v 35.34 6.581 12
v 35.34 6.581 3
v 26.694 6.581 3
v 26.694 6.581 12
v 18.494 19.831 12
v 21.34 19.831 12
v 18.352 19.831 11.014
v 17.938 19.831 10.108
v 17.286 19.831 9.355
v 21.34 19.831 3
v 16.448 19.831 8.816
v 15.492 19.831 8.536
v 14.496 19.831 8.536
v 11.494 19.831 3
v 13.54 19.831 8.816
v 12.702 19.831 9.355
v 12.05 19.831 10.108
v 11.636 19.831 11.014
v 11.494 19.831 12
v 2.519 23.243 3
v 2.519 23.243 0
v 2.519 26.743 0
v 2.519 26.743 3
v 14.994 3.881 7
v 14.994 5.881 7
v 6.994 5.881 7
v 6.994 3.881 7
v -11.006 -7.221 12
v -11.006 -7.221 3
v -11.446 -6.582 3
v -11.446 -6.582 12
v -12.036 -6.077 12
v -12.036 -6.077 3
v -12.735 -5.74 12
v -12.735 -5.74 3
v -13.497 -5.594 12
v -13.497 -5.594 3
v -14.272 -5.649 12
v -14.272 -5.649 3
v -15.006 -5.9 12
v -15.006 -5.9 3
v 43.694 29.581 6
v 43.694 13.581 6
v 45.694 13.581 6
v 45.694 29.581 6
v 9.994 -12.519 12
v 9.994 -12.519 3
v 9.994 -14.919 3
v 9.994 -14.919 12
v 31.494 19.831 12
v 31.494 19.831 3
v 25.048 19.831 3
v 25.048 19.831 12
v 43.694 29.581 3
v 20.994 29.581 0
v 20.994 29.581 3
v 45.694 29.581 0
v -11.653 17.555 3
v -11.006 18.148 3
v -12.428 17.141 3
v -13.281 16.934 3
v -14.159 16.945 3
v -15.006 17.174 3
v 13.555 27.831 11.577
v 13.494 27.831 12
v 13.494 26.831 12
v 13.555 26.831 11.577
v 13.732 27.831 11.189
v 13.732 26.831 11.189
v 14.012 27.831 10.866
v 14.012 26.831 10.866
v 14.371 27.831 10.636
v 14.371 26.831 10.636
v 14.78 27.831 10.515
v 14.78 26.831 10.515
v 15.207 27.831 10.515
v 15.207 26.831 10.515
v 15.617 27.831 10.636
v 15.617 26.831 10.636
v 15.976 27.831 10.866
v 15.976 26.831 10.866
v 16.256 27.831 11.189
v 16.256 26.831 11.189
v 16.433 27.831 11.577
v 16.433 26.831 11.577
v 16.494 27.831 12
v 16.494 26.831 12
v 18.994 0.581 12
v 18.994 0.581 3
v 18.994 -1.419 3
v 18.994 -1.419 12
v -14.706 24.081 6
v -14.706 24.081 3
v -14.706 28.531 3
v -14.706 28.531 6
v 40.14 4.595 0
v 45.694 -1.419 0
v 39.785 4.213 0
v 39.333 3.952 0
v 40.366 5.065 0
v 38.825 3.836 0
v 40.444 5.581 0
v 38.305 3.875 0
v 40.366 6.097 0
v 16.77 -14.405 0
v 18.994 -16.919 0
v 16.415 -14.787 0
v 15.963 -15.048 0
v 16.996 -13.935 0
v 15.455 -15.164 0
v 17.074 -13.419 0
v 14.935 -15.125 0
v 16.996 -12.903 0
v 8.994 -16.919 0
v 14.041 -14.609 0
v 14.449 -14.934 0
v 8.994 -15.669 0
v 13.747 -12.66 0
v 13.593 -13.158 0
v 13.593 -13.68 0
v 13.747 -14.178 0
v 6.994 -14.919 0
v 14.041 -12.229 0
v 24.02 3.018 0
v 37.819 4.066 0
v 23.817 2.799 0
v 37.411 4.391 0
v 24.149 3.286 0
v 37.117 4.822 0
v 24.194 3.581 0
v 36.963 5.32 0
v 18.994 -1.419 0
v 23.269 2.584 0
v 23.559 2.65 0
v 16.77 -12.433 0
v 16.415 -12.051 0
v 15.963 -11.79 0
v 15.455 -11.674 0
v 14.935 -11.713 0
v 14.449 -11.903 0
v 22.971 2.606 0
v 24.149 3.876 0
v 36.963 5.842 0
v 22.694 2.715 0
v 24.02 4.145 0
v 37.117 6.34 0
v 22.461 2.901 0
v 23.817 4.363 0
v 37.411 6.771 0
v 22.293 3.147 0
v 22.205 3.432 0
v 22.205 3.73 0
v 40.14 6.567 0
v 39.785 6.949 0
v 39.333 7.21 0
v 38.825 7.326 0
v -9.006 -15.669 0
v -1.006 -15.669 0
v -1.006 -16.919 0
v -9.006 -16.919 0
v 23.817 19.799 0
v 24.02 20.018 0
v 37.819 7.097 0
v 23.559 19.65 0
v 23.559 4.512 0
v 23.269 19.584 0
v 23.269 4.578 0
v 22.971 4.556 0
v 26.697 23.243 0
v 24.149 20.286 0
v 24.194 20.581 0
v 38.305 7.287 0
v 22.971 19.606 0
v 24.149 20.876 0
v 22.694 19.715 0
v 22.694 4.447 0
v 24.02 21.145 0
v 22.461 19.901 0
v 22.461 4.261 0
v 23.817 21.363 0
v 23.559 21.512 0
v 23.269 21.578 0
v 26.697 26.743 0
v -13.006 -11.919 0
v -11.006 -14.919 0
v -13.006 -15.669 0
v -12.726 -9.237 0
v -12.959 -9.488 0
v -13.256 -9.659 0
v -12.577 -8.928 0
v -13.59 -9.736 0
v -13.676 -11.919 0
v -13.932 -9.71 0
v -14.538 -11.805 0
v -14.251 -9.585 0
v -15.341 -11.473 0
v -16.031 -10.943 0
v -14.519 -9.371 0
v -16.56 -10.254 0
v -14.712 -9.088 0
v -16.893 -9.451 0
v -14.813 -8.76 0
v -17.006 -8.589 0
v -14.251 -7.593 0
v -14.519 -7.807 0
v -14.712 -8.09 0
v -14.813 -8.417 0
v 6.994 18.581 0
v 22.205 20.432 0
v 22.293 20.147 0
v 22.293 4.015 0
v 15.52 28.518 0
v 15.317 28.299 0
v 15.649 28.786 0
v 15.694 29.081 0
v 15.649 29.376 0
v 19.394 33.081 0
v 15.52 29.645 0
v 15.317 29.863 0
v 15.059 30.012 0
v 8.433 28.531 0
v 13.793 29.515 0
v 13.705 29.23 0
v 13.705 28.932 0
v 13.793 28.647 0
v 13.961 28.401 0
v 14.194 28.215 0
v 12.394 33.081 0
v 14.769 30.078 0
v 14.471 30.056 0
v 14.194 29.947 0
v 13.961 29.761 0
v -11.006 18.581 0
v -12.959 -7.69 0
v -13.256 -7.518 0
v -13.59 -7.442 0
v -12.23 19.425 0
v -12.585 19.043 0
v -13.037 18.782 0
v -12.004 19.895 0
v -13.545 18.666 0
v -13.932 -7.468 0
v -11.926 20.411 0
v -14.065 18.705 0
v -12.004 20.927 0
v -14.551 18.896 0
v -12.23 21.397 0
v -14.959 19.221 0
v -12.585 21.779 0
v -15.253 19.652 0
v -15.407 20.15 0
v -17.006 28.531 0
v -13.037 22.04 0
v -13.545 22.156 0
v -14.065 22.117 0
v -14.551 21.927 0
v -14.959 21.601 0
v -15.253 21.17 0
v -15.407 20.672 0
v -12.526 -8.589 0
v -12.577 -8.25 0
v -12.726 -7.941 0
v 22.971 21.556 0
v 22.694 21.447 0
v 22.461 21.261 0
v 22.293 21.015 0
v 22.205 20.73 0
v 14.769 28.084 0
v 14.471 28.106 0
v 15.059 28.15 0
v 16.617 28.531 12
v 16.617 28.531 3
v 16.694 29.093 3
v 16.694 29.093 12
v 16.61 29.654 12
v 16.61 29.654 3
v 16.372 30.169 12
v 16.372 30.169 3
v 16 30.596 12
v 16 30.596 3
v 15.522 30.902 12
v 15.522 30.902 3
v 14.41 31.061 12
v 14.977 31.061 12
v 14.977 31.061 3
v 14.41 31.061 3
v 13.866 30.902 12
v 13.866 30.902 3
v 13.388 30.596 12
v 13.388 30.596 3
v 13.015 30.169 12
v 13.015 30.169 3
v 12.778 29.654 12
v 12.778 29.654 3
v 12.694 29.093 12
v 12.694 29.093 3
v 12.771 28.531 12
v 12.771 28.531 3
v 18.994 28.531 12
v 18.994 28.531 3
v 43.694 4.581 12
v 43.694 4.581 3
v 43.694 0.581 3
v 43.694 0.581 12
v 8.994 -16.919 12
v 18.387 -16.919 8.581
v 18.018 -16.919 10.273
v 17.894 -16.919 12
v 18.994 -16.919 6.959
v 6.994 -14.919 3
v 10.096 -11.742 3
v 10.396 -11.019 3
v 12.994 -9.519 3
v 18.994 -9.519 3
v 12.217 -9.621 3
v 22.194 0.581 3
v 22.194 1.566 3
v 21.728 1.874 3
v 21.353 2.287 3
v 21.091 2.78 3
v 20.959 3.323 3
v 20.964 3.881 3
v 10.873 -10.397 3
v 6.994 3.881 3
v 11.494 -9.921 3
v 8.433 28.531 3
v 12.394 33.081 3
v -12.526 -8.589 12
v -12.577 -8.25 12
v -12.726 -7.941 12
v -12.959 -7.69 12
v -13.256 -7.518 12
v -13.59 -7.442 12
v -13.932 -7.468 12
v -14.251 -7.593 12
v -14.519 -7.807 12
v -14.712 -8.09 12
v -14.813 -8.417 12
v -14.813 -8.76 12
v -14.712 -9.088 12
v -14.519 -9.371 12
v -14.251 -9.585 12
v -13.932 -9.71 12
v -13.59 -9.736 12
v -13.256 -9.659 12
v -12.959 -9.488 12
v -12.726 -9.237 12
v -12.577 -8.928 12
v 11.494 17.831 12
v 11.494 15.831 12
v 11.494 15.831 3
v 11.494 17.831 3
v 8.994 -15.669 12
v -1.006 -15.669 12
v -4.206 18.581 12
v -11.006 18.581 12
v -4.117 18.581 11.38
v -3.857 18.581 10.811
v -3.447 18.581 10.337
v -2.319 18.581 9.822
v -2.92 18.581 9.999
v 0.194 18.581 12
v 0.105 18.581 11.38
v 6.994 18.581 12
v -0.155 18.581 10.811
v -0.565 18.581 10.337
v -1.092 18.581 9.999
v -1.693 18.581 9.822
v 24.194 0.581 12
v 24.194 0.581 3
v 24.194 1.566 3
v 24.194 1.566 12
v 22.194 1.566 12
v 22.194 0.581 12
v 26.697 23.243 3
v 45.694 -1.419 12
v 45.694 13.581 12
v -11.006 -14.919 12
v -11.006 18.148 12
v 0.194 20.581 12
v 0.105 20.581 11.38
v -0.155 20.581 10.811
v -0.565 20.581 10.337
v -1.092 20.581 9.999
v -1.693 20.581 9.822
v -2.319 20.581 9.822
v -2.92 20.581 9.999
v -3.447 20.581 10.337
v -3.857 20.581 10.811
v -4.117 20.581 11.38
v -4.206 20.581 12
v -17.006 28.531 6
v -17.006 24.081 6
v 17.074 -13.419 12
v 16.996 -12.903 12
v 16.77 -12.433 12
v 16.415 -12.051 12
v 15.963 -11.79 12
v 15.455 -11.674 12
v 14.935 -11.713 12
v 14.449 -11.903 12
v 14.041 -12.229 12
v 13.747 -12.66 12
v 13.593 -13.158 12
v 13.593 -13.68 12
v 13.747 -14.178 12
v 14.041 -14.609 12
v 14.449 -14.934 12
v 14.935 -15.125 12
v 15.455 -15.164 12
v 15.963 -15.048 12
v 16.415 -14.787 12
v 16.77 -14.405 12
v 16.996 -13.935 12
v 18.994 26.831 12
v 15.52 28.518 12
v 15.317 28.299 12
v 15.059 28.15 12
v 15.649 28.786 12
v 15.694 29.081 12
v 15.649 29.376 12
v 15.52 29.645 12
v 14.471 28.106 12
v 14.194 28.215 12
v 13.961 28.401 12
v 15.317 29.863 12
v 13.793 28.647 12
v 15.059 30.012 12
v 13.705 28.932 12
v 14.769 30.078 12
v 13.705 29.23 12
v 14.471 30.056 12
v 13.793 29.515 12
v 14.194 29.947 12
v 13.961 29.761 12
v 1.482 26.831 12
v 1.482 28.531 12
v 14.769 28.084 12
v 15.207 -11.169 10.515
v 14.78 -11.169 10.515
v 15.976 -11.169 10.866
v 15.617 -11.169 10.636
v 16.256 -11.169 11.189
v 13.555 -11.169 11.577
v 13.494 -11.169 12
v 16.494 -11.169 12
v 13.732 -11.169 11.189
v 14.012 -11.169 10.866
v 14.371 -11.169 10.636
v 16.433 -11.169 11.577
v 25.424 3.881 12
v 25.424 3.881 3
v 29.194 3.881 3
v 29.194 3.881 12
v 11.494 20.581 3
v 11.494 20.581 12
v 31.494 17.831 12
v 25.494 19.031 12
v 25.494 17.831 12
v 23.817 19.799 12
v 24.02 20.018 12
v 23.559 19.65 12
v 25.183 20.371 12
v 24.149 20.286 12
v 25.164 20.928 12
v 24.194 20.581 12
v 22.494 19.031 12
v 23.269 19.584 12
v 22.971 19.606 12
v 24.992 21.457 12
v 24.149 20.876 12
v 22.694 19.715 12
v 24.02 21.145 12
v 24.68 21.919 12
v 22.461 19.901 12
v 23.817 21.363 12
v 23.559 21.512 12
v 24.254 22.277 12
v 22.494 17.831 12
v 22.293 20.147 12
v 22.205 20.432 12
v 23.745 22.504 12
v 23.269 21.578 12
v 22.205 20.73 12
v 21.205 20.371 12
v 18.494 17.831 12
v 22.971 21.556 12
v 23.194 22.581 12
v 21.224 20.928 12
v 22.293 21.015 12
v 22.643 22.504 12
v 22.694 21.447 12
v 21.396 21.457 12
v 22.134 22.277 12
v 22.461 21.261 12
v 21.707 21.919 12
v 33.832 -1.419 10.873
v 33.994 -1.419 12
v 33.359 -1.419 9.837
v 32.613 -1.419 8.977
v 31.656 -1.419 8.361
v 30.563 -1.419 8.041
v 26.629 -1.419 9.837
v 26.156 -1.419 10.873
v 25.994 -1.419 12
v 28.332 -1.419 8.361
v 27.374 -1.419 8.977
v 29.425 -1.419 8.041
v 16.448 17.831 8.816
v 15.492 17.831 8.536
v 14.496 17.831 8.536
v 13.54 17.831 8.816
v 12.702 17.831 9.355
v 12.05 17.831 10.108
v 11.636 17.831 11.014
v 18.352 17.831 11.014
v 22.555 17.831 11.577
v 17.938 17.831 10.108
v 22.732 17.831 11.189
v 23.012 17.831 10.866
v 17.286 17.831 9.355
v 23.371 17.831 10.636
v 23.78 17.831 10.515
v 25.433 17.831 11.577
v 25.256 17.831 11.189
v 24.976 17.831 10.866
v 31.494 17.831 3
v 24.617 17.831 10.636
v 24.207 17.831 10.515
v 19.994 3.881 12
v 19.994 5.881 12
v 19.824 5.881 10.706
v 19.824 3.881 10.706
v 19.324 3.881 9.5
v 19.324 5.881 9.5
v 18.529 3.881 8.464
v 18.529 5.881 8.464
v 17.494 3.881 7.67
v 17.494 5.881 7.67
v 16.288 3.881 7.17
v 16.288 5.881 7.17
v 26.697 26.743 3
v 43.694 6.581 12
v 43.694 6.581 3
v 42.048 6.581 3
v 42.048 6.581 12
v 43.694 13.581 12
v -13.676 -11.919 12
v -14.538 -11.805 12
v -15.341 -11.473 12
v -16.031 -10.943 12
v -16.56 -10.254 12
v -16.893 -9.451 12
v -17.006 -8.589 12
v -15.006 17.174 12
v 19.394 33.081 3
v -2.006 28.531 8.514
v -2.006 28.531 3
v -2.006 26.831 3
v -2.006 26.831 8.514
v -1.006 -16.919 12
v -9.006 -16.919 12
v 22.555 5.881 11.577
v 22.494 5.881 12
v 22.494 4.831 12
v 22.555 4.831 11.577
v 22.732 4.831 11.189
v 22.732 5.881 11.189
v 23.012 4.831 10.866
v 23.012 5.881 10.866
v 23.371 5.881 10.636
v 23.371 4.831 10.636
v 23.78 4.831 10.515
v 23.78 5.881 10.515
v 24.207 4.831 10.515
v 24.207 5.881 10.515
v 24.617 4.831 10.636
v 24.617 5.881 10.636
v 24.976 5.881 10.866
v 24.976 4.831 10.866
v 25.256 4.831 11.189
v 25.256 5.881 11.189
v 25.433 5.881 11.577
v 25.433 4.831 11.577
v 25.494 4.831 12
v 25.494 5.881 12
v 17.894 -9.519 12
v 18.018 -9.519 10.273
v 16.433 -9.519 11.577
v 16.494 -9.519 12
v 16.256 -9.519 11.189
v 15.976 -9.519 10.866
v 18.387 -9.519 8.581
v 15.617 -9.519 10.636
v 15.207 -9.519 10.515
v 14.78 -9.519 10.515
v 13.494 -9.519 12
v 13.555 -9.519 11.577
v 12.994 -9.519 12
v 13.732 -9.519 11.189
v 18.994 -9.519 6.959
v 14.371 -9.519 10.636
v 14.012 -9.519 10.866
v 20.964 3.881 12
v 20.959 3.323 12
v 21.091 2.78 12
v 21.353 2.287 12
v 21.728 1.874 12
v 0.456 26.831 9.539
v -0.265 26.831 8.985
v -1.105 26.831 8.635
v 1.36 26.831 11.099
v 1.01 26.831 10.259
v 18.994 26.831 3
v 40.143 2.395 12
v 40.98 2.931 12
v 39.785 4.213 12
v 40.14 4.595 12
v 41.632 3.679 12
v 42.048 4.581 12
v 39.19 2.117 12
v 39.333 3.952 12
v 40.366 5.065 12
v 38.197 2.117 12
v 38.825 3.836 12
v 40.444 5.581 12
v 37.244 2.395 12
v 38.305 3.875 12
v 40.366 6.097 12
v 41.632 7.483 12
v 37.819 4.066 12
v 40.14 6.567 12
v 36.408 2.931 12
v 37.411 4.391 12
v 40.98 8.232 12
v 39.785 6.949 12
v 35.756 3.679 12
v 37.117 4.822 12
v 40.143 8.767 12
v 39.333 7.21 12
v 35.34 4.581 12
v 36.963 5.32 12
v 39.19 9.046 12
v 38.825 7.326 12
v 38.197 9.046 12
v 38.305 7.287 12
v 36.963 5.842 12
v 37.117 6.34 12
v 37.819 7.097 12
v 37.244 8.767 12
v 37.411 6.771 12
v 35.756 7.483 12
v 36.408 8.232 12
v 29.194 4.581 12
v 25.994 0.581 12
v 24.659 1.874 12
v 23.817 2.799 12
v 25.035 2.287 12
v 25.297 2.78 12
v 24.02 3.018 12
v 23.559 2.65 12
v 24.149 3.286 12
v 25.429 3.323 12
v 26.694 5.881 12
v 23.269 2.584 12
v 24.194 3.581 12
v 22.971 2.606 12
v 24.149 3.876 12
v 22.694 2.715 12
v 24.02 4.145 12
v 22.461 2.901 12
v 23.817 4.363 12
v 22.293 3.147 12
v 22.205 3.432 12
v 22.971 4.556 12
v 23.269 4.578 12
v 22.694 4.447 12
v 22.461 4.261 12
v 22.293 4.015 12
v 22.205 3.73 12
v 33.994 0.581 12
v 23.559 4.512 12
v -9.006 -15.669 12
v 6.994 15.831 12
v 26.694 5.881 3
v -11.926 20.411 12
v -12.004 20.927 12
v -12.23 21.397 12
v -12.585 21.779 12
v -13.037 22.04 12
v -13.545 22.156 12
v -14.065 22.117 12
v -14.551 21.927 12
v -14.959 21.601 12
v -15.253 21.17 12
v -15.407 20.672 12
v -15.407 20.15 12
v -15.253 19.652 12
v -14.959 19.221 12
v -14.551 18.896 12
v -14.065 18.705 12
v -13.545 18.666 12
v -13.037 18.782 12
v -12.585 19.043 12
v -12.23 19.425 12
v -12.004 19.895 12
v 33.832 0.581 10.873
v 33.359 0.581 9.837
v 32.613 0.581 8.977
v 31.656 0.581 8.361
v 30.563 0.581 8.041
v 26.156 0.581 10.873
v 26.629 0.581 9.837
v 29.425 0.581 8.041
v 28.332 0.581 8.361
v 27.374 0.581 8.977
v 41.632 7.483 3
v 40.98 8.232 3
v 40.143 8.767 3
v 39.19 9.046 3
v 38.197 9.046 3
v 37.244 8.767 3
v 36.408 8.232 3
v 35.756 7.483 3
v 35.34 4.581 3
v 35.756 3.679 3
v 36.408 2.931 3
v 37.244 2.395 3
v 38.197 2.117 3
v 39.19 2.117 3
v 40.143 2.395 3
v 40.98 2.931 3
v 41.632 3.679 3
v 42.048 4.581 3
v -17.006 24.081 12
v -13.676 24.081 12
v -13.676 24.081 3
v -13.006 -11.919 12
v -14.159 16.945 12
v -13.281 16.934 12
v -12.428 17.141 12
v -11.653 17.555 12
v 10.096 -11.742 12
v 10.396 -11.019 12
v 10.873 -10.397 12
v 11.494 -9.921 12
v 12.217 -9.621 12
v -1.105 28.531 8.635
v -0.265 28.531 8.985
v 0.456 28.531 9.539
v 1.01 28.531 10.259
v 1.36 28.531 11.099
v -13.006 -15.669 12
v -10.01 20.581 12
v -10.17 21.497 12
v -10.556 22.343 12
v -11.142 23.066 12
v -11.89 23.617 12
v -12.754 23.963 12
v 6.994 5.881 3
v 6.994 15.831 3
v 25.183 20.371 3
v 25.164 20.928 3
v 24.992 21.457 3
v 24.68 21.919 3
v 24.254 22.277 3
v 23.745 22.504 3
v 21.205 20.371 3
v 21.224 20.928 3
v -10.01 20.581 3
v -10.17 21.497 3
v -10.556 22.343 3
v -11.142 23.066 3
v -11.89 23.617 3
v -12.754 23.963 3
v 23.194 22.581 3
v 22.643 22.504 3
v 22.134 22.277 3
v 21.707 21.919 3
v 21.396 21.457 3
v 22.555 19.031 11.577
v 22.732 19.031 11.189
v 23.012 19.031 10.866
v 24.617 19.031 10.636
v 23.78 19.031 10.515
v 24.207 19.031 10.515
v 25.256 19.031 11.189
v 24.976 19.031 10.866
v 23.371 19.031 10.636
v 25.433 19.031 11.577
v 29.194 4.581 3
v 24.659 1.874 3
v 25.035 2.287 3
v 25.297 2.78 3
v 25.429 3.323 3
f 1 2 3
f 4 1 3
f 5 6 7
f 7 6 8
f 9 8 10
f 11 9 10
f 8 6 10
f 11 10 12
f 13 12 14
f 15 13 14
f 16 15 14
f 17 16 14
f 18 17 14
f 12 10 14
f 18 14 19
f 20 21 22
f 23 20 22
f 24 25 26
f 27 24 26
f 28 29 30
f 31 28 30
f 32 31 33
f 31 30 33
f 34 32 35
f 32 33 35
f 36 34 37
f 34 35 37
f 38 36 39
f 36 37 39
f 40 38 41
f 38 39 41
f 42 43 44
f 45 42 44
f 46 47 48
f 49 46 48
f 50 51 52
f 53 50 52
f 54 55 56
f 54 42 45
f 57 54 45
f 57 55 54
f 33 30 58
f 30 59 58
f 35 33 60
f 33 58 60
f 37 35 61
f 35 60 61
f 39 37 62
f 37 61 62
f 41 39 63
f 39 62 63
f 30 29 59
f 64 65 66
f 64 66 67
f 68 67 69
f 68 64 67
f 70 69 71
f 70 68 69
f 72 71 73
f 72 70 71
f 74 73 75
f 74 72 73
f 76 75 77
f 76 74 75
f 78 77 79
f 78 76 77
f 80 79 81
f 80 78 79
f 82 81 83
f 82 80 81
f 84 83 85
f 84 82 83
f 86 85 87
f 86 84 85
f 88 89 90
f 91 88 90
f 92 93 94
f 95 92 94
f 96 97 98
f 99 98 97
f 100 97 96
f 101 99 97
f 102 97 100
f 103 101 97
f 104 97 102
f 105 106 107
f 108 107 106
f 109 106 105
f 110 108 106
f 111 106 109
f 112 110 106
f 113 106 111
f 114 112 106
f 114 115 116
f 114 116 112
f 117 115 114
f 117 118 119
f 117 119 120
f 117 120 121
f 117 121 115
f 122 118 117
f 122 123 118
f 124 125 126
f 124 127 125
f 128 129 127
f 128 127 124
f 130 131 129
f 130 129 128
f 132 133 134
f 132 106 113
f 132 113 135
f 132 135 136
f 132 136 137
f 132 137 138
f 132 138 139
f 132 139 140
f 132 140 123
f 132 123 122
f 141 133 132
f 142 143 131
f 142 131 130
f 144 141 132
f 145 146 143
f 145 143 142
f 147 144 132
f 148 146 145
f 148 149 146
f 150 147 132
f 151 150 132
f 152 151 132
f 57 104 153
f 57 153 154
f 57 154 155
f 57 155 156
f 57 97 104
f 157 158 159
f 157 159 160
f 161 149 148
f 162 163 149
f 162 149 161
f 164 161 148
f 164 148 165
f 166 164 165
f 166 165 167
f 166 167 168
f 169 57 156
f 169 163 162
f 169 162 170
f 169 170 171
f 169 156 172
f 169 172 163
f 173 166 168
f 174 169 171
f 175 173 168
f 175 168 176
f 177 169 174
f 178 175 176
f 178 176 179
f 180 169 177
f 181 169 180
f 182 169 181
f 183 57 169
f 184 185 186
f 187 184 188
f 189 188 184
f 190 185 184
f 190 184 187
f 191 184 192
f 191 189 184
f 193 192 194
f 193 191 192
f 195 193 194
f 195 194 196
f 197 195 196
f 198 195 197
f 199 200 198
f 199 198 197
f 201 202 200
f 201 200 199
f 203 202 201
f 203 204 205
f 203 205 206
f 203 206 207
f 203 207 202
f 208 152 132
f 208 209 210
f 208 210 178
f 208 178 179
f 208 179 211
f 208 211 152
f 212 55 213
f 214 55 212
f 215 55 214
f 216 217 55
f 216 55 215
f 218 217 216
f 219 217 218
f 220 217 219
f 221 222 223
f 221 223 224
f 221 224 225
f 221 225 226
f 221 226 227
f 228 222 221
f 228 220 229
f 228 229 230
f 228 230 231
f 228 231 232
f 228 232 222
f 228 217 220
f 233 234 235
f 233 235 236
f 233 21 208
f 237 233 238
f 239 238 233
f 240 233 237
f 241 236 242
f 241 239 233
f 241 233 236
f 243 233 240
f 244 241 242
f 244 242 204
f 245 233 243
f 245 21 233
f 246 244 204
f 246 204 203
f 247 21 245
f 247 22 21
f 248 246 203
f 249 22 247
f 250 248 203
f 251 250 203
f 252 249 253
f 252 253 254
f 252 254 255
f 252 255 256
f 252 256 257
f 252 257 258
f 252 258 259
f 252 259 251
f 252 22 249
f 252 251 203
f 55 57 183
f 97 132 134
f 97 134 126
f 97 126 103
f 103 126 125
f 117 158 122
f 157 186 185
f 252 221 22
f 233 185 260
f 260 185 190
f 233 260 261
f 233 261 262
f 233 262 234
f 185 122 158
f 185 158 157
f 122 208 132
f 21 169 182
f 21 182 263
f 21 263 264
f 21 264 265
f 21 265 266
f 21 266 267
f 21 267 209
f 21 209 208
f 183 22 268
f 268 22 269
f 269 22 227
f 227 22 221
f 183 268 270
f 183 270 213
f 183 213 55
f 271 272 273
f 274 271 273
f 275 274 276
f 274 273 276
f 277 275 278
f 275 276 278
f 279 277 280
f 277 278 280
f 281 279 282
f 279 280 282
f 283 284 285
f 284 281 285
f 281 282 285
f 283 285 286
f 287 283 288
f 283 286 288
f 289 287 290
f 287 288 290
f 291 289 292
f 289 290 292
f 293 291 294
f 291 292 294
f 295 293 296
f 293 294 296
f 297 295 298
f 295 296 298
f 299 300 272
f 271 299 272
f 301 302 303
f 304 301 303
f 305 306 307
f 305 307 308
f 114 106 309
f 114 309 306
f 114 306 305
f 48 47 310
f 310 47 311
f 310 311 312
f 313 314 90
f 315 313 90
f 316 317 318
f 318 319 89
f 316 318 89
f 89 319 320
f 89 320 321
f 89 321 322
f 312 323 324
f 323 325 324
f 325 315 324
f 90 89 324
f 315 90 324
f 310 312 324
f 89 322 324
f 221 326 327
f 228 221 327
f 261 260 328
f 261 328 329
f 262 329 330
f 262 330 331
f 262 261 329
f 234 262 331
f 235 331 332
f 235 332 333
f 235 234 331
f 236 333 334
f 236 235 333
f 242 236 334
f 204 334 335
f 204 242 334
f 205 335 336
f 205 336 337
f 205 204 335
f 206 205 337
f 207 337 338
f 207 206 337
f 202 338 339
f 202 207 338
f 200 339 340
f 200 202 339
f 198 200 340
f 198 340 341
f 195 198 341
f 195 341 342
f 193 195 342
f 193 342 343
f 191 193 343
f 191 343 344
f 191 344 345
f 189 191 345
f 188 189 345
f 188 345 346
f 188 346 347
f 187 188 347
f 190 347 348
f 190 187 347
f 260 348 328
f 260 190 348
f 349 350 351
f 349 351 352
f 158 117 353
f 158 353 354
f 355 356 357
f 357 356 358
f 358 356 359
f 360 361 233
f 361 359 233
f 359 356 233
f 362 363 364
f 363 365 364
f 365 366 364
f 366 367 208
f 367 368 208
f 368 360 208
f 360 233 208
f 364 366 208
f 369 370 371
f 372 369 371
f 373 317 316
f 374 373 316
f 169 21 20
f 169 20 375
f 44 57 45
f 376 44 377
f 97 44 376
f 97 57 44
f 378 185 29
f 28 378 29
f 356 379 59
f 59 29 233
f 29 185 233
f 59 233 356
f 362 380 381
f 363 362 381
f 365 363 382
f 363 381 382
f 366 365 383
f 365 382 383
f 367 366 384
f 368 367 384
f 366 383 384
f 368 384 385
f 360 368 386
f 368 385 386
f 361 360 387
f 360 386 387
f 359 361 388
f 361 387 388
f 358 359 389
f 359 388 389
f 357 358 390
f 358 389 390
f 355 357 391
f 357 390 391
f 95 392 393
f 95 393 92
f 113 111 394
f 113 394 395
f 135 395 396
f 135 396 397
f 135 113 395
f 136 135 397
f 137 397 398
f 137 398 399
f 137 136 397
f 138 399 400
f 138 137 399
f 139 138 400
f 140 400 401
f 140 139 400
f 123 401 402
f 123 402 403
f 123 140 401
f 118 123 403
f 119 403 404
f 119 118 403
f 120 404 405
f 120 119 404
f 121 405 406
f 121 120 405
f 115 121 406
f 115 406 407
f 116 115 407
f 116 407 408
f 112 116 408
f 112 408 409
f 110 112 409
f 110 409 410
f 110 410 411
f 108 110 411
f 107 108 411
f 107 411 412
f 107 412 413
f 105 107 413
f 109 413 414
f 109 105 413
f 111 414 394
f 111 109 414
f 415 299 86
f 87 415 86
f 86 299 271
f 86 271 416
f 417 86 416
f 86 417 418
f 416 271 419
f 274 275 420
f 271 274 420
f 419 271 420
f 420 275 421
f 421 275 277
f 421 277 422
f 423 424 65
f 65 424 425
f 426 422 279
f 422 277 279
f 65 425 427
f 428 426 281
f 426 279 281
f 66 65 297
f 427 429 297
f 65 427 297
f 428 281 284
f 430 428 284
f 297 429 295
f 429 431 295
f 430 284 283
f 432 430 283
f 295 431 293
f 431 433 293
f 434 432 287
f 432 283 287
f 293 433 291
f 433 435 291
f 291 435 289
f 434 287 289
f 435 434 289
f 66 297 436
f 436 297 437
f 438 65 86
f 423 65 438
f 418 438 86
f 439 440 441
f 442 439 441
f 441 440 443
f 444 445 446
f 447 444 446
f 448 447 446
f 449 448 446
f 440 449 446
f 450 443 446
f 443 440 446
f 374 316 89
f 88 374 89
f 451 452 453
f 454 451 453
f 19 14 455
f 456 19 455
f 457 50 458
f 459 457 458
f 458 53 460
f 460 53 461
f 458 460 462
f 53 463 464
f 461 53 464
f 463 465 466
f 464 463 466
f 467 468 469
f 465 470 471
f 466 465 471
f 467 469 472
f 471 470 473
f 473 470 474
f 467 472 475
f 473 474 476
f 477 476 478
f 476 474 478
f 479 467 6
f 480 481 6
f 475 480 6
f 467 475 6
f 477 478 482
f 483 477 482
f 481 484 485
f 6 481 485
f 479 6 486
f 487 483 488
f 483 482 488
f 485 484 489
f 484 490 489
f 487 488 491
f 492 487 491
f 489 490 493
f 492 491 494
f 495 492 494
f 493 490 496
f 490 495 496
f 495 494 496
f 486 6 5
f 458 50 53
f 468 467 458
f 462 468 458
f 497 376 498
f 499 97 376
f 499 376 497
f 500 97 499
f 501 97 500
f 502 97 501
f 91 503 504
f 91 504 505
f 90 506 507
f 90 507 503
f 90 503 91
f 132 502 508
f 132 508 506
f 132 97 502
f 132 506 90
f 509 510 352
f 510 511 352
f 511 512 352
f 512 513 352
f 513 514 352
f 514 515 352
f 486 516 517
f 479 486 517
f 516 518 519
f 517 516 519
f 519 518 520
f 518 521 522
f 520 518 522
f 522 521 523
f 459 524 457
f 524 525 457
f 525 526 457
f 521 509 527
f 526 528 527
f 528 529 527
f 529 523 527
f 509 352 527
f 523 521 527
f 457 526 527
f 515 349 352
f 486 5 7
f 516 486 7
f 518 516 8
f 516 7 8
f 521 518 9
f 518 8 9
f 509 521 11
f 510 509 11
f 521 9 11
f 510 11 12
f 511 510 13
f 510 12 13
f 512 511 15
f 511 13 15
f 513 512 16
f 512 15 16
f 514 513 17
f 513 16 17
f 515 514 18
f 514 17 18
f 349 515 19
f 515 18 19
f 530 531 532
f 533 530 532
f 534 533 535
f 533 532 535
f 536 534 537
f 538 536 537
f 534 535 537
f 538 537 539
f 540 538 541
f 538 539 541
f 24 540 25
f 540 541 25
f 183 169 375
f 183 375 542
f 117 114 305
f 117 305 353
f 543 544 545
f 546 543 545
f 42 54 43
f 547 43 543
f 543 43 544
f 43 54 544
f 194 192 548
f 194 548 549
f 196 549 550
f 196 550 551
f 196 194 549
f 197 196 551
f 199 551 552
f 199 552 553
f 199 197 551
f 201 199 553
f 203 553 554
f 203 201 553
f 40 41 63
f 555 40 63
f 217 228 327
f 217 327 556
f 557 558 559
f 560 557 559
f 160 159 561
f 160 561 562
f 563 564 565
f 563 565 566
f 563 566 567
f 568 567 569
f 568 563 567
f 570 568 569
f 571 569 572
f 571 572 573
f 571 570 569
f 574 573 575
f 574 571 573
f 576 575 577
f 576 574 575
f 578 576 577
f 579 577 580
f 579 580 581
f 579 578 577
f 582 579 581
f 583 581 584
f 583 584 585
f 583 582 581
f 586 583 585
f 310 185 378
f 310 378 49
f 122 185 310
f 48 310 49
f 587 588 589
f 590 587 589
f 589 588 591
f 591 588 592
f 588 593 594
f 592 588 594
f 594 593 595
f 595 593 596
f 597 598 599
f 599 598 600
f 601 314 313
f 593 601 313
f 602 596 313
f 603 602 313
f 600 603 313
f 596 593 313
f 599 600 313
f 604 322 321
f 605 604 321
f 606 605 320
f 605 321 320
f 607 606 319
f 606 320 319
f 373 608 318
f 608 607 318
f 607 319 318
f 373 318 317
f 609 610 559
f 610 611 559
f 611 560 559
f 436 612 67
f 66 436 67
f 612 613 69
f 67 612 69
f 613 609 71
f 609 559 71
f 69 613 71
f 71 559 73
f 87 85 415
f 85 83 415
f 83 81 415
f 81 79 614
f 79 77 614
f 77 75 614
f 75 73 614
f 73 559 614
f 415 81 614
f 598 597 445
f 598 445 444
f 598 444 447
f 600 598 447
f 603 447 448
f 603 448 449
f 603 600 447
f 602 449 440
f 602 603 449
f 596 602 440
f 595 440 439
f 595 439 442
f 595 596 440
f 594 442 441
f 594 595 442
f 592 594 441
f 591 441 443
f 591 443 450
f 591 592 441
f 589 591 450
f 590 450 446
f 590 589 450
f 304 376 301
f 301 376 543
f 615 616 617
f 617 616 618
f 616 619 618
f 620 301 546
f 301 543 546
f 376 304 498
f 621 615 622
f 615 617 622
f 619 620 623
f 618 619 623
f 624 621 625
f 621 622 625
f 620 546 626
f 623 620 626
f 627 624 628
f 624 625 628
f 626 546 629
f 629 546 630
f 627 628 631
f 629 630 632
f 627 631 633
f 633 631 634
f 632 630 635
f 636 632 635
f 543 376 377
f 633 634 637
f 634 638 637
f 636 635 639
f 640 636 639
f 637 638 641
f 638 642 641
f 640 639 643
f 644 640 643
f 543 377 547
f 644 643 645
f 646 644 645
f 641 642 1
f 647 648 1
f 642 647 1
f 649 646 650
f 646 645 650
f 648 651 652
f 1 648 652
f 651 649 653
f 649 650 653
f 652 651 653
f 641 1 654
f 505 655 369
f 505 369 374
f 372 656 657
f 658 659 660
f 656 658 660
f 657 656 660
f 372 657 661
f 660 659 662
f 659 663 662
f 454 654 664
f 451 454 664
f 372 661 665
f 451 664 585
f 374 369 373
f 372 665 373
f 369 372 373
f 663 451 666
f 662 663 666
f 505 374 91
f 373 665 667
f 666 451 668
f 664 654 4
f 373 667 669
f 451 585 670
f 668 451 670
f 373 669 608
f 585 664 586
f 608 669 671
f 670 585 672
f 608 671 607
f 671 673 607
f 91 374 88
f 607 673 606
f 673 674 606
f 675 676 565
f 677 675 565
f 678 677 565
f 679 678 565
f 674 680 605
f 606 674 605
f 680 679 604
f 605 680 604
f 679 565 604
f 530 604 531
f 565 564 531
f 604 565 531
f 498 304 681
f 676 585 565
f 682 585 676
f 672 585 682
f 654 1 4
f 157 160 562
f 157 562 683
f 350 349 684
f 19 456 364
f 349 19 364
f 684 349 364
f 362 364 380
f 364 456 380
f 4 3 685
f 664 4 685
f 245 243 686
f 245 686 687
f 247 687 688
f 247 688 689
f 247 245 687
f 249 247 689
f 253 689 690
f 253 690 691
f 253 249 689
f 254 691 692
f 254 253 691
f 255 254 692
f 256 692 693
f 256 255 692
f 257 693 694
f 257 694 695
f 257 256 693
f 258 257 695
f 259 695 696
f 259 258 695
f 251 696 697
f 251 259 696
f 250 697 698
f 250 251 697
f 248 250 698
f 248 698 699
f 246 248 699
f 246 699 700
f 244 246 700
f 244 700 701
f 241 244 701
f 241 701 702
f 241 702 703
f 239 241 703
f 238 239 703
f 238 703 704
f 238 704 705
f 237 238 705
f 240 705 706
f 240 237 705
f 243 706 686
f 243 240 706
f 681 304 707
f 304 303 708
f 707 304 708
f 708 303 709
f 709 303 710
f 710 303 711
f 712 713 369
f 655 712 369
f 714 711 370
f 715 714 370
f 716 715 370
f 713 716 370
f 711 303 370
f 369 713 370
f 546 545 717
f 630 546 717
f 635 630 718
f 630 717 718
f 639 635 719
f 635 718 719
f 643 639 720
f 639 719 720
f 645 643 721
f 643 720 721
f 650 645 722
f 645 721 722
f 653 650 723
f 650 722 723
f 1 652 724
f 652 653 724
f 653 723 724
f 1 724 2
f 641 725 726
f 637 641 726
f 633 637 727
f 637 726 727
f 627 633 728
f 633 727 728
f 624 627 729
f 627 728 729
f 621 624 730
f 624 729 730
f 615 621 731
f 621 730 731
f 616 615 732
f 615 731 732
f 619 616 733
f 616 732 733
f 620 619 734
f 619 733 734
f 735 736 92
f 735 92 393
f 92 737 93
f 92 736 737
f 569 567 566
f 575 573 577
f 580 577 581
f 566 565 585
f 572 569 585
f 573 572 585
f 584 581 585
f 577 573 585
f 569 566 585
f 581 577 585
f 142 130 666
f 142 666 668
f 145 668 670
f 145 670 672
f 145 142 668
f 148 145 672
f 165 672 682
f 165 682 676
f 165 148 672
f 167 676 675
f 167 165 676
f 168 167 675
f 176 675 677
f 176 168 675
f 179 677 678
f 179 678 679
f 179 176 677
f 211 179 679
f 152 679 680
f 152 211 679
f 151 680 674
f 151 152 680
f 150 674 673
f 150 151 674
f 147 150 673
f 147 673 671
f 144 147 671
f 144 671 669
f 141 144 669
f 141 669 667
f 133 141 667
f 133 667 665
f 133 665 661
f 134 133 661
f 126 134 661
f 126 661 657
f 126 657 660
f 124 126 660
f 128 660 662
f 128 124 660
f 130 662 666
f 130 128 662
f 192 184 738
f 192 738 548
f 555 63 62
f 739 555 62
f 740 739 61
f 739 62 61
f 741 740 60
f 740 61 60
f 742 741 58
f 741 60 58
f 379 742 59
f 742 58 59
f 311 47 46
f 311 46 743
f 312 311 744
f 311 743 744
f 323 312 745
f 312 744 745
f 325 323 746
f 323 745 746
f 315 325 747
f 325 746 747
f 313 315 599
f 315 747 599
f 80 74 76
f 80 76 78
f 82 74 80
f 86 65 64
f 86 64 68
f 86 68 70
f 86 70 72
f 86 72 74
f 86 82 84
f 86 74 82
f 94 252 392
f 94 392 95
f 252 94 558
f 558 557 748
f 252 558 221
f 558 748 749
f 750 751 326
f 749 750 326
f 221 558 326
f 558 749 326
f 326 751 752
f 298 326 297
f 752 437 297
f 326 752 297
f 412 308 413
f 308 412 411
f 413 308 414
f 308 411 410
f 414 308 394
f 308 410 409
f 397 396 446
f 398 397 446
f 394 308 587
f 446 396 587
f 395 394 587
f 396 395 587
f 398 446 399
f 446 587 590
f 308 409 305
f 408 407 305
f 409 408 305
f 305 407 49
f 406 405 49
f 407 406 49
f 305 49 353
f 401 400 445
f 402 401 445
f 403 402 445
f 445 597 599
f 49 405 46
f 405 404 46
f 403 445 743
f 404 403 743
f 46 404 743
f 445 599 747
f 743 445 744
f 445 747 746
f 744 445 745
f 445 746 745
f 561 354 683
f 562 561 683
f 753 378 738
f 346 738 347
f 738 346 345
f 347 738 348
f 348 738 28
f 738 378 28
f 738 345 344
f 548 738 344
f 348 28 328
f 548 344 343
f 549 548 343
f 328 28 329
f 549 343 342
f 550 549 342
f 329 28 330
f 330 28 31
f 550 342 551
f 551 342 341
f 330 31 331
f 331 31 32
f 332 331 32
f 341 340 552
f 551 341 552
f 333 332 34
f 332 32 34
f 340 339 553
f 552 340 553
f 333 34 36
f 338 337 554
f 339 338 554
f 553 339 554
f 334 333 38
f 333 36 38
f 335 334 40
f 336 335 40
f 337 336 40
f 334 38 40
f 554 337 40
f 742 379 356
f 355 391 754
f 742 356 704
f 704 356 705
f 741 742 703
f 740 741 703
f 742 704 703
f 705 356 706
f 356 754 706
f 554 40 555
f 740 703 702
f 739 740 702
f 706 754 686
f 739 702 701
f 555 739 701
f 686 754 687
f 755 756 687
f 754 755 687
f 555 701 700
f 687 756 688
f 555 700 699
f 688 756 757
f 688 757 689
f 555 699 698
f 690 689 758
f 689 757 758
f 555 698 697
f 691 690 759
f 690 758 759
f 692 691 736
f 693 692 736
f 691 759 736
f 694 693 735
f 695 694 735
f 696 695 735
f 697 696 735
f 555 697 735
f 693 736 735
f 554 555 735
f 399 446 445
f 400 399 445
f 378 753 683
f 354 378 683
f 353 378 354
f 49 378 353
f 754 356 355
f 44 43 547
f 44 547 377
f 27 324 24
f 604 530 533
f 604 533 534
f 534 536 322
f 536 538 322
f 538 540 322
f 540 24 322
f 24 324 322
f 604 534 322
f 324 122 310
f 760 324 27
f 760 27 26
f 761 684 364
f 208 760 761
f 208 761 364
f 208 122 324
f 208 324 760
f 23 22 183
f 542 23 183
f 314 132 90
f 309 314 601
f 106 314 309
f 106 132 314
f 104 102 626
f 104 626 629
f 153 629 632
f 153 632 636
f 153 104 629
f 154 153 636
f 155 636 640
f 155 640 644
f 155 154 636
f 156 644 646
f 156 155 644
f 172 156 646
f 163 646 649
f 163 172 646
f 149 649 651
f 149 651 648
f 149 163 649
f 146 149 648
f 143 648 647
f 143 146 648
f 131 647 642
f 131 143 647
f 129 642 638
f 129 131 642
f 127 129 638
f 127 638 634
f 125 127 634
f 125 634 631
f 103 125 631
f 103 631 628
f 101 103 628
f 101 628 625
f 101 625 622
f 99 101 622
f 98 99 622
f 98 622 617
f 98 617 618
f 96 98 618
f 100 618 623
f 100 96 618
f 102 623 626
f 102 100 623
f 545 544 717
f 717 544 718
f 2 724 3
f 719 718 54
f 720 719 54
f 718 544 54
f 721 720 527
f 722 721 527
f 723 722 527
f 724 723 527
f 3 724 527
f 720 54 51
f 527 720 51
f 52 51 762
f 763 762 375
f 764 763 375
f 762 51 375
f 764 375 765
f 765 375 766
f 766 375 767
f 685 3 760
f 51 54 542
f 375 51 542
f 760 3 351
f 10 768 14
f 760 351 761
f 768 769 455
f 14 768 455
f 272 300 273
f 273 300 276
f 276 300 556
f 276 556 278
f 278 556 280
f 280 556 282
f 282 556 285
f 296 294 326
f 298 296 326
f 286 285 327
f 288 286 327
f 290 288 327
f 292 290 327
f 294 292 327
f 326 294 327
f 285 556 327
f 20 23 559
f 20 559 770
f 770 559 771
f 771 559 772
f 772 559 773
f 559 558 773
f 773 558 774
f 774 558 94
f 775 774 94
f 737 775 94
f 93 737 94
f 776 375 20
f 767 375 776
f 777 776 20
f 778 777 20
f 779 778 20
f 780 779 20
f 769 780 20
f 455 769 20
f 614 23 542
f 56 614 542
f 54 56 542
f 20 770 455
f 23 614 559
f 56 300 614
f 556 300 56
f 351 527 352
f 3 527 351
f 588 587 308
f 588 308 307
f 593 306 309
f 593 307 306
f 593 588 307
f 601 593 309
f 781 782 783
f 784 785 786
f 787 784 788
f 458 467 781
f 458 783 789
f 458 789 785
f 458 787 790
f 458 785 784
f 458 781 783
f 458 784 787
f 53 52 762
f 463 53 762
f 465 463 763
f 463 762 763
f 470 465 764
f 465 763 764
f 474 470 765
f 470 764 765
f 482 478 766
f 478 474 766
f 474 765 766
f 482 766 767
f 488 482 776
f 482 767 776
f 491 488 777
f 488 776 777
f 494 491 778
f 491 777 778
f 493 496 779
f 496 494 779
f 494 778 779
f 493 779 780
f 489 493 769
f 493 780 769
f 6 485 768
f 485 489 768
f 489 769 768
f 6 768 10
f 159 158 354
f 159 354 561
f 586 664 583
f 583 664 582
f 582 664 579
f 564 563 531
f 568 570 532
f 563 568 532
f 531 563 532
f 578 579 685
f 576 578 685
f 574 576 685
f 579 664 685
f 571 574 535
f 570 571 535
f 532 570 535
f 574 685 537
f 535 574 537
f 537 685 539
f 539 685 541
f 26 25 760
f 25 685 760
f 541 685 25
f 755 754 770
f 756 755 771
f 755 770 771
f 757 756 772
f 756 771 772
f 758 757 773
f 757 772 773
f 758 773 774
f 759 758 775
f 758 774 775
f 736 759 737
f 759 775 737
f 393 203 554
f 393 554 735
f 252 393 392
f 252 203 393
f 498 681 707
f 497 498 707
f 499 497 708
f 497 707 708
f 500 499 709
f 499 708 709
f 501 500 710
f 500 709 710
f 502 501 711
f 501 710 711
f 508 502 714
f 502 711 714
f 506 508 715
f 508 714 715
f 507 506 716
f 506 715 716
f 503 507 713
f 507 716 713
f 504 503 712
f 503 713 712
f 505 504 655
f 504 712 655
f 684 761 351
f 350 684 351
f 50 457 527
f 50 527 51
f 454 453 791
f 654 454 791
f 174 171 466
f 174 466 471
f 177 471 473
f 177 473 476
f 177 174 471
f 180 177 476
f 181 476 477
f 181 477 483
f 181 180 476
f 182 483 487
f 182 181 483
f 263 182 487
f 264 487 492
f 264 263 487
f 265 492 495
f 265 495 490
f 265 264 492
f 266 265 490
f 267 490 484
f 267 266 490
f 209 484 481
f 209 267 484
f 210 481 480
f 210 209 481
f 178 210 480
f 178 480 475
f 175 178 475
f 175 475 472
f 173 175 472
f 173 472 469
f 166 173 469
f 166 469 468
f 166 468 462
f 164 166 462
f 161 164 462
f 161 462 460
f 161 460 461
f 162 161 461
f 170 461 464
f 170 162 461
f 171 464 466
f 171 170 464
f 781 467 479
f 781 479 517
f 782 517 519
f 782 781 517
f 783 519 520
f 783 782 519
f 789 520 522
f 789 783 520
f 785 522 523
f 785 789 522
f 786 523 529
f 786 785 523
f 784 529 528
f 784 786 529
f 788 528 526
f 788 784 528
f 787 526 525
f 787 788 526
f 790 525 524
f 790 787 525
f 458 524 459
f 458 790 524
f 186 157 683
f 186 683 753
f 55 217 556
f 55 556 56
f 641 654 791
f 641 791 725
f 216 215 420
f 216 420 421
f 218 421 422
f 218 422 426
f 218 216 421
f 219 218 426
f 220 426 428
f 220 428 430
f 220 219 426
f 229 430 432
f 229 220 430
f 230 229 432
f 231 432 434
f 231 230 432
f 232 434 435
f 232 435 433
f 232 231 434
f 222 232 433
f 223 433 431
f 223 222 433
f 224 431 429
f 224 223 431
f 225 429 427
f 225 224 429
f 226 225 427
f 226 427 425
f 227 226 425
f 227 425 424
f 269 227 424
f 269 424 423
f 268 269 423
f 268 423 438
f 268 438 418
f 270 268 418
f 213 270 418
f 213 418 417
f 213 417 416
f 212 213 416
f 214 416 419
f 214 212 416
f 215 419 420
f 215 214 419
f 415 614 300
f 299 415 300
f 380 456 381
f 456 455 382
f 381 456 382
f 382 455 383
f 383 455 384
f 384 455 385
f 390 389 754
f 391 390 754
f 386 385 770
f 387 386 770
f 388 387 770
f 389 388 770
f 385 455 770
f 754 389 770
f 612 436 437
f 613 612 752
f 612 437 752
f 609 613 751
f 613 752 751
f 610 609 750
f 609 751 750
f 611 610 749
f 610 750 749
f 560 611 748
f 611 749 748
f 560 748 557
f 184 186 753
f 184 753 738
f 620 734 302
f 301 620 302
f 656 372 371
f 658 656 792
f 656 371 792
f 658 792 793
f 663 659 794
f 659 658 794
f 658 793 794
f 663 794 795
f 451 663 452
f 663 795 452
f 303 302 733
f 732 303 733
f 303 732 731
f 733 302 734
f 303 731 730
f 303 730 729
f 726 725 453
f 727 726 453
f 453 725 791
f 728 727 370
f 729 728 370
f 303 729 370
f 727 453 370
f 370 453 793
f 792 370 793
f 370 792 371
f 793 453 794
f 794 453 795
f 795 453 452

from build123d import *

# Parameters (mm, degrees)
ESQUISSE1_R                   = 1.15
ESQUISSE1_R_2                 = 1.75
ESQUISSE1_R_3                 = 1
ESQUISSE1_W                   = 18
ESQUISSE1_H                   = 33.5
BOSS_EXTRU_2_DEPTH            = 12
ENL_V_MAT_EXTRU_1_DEPTH       = 75.057589753
ESQUISSE3_W                   = 2.3
ESQUISSE3_H                   = 33.5
ESQUISSE3_W_2                 = 2
ESQUISSE3_H_2                 = 16
ENL_V_MAT_EXTRU_2_DEPTH       = 74.753146373
CONG_1_R                      = 3
ENL_V_MAT_EXTRU_3_REACH       = 62.317
ESQUISSE4_R                   = 2.2
ENL_V_MAT_EXTRU_4_REACH       = 67.556
ESQUISSE5_R                   = 3.5
ESQUISSE6_R                   = 3.5
ENL_V_MAT_EXTRU_5_DEPTH       = 5
ESQUISSE7_W                   = 8.040923999
ESQUISSE7_H                   = 1.8
ENL_V_MAT_EXTRU_6_DEPTH       = 1
ENL_V_MAT_EXTRU_7_DEPTH       = 3
ENL_V_MAT_EXTRU_7_DEPTH_BACK  = 75.185757393
ESQUISSE8_W                   = 24.177827552
ESQUISSE8_H                   = 3.5
ENL_V_MAT_EXTRU_8_REACH       = 72.034
ENL_V_MAT_EXTRU_9_REACH       = 76.033
ESQUISSE10_R                  = 4
ESQUISSE11_R                  = 12.099999999
ENL_V_MAT_EXTRU_10_DEPTH      = 76.583950893
ENL_V_MAT_EXTRU_11_DEPTH      = 38
ENL_V_MAT_EXTRU_11_DEPTH_BACK = 1
ESQUISSE17_R                  = 1.5
ENL_V_MAT_EXTRU_12_DEPTH      = 13
ENL_V_MAT_EXTRU_12_DEPTH_BACK = 1.2
ESQUISSE18_R                  = 1.5
ENL_V_MAT_EXTRU_13_DEPTH      = 10


with BuildPart() as part:
    # Esquisse1 → Boss.-Extru.2 (new body)
    with BuildSketch(Plane.XY):
        with BuildLine():
            Line((-12.306087575, 57.58118588), (-12.306087575, 54.58118588))
            Line((-12.306087575, 54.58118588), (12.393912425, 33.08118588))
            Line((12.393912425, 33.08118588), (19.393912425, 33.08118588))
            Line((19.393912425, 33.08118588), (20.993912425, 29.58118588))
            Line((20.993912425, 29.58118588), (45.693912425, 29.58118588))
            Line((45.693912425, 29.58118588), (45.693912425, -1.41881412))
            Line((45.693912425, -1.41881412), (18.993912425, -1.41881412))
            Line((18.993912425, -1.41881412), (18.993912425, -16.91881412))
            Line((18.993912425, -16.91881412), (8.993912425, -16.91881412))
            Line((8.993912425, -16.91881412), (8.993912425, -15.66881412))
            Line((8.993912425, -15.66881412), (-1.006087575, -15.66881412))
            Line((-1.006087575, -15.66881412), (-1.006087575, -16.91881412))
            Line((-1.006087575, -16.91881412), (-9.006087575, -16.91881412))
            Line((-9.006087575, -16.91881412), (-9.006087575, -15.66881412))
            Line((-9.006087575, -15.66881412), (-13.006087575, -15.66881412))
            Line((-13.006087575, -15.66881412), (-13.006087575, -11.91881412))
            Line((-13.006087575, -11.91881412), (-13.676087575, -11.91881412))
            ThreePointArc((-13.676087575, -11.91881412), (-16.030753157, -10.943479702), (-17.006087575, -8.58881412))
            Line((-17.006087575, -8.58881412), (-17.006087575, 57.58118588))
            Line((-17.006087575, 57.58118588), (-12.306087575, 57.58118588))
        make_face()
        with Locations((-13.676087575, -8.58881412)):
            Circle(ESQUISSE1_R, mode=Mode.SUBTRACT)
        with Locations((-13.676087575, 20.41118588)):
            Circle(ESQUISSE1_R_2, mode=Mode.SUBTRACT)
        with Locations((15.323912425, -13.41881412)):
            Circle(ESQUISSE1_R_2, mode=Mode.SUBTRACT)
        with Locations((38.693912425, 5.58118588)):
            Circle(ESQUISSE1_R_2, mode=Mode.SUBTRACT)
        with Locations((23.193912425, 3.58118588)):
            Circle(ESQUISSE1_R_3, mode=Mode.SUBTRACT)
        with Locations((23.193912425, 20.58118588)):
            Circle(ESQUISSE1_R_3, mode=Mode.SUBTRACT)
        with Locations((14.693912425, 29.08118588)):
            Circle(ESQUISSE1_R_3, mode=Mode.SUBTRACT)
        with Locations((-2.006087575, 1.83118588)):
            Rectangle(ESQUISSE1_W, ESQUISSE1_H, mode=Mode.SUBTRACT)
    extrude(amount=BOSS_EXTRU_2_DEPTH)

    # Esquisse2 → Enlèv. mat.-Extru.1 (cut, through all)
    # profile 1 of 4: a face of its own
    with BuildSketch(Plane.XY.offset(3)):
        with BuildLine():
            ThreePointArc((25.047962046, 19.83118588), (23.193912425, 22.58118588), (21.339862803, 19.83118588))
            Line((21.339862803, 19.83118588), (11.493912425, 19.83118588))
            Line((11.493912425, 19.83118588), (11.493912425, 20.58118588))
            Line((11.493912425, 20.58118588), (-10.010027019, 20.58118588))
            ThreePointArc((-10.010027019, 20.58118588), (-11.141822396, 23.065691483), (-13.676087575, 24.08118588))
            Line((-13.676087575, 24.08118588), (-14.706087575, 24.08118588))
            Line((-14.706087575, 24.08118588), (-14.706087575, 57.58118588))
            Line((-14.706087575, 57.58118588), (-12.306087575, 57.58118588))
            Line((-12.306087575, 57.58118588), (-12.306087575, 54.58118588))
            Line((-12.306087575, 54.58118588), (12.393912425, 33.08118588))
            Line((12.393912425, 33.08118588), (19.393912425, 33.08118588))
            Line((19.393912425, 33.08118588), (20.993912425, 29.58118588))
            Line((20.993912425, 29.58118588), (43.693912425, 29.58118588))
            Line((43.693912425, 29.58118588), (43.693912425, 6.58118588))
            Line((43.693912425, 6.58118588), (42.048014391, 6.58118588))
            ThreePointArc((42.048014391, 6.58118588), (38.693912425, 9.08118588), (35.339810458, 6.58118588))
            Line((35.339810458, 6.58118588), (26.693912425, 6.58118588))
            Line((26.693912425, 6.58118588), (26.693912425, 5.88118588))
            Line((26.693912425, 5.88118588), (6.993912425, 5.88118588))
            Line((6.993912425, 5.88118588), (6.993912425, 15.83118588))
            Line((6.993912425, 15.83118588), (11.493912425, 15.83118588))
            Line((11.493912425, 15.83118588), (11.493912425, 17.83118588))
            Line((11.493912425, 17.83118588), (31.493912425, 17.83118588))
            Line((31.493912425, 17.83118588), (31.493912425, 19.83118588))
            Line((31.493912425, 19.83118588), (25.047962046, 19.83118588))
        make_face()
        with BuildLine():
            ThreePointArc((16.616800877, 28.53118588), (14.693912425, 31.08118588), (12.771023972, 28.53118588))
            Line((12.771023972, 28.53118588), (-2.006087575, 28.53118588))
            Line((-2.006087575, 28.53118588), (-2.006087575, 26.83118588))
            Line((-2.006087575, 26.83118588), (18.993912425, 26.83118588))
            Line((18.993912425, 26.83118588), (18.993912425, 28.53118588))
            Line((18.993912425, 28.53118588), (16.616800877, 28.53118588))
        make_face(mode=Mode.SUBTRACT)
    # profile 2 of 4: a face of its own
    with BuildSketch(Plane.XY.offset(3)):
        with BuildLine():
            ThreePointArc((20.964002112, 3.88118588), (21.206819115, 2.52574276), (22.193912425, 1.565621443))
            Line((22.193912425, 1.565621443), (22.193912425, 0.58118588))
            Line((22.193912425, 0.58118588), (18.993912425, 0.58118588))
            Line((18.993912425, 0.58118588), (18.993912425, -9.51881412))
            Line((18.993912425, -9.51881412), (9.993912425, -9.51881412))
            Line((9.993912425, -9.51881412), (9.993912425, -14.91881412))
            Line((9.993912425, -14.91881412), (6.993912425, -14.91881412))
            Line((6.993912425, -14.91881412), (6.993912425, 3.88118588))
            Line((6.993912425, 3.88118588), (20.964002112, 3.88118588))
        make_face()
    # profile 3 of 4: a face of its own
    with BuildSketch(Plane.XY.offset(3)):
        with BuildLine():
            ThreePointArc((-15.006087575, 17.173733177), (-12.847657165, 17.010641356), (-11.006087575, 18.148201125))
            Line((-11.006087575, 18.148201125), (-11.006087575, -7.220932547))
            ThreePointArc((-11.006087575, -7.220932547), (-12.735191712, -5.740180242), (-15.006087575, -5.899743649))
            Line((-15.006087575, -5.899743649), (-15.006087575, 17.173733177))
        make_face()
    # profile 4 of 4: a face of its own
    with BuildSketch(Plane.XY.offset(3)):
        with BuildLine():
            ThreePointArc((24.193912425, 1.565621443), (25.181005734, 2.52574276), (25.423822737, 3.88118588))
            Line((25.423822737, 3.88118588), (29.193912425, 3.88118588))
            Line((29.193912425, 3.88118588), (29.193912425, 4.58118588))
            Line((29.193912425, 4.58118588), (35.339810458, 4.58118588))
            ThreePointArc((35.339810458, 4.58118588), (38.693912425, 2.08118588), (42.048014391, 4.58118588))
            Line((42.048014391, 4.58118588), (43.693912425, 4.58118588))
            Line((43.693912425, 4.58118588), (43.693912425, 0.58118588))
            Line((43.693912425, 0.58118588), (24.193912425, 0.58118588))
            Line((24.193912425, 0.58118588), (24.193912425, 1.565621443))
        make_face()
    extrude(amount=ENL_V_MAT_EXTRU_1_DEPTH, mode=Mode.SUBTRACT)

    # Esquisse3 → Enlèv. mat.-Extru.2 (cut, through all)
    with BuildSketch(Plane.XY.offset(6)):
        with Locations((-15.856087575, 40.83118588)):
            Rectangle(ESQUISSE3_W, ESQUISSE3_H)
        with Locations((44.693912425, 21.58118588)):
            Rectangle(ESQUISSE3_W_2, ESQUISSE3_H_2)
    extrude(amount=ENL_V_MAT_EXTRU_2_DEPTH, mode=Mode.SUBTRACT)

    # Congé1
    cong_1_edges = [part.edges().sort_by_distance(p)[0] for p in [
        (9.993912425, -9.51881412, 7.5),
    ]]
    fillet(cong_1_edges, radius=CONG_1_R)

    # Esquisse4 → Enlèv. mat.-Extru.3 (cut, up to next)
    with BuildSketch(Plane(origin=(0, 20.58118588, 0), x_dir=(1, 0, 0), z_dir=(0, 1, 0)), mode=Mode.PRIVATE) as enl_v_mat_extru_3_sk1:
        with Locations((-2.006087575, -12)):
            Circle(ESQUISSE4_R)
    enl_v_mat_extru_3_tool1 = extrude(enl_v_mat_extru_3_sk1.sketch, amount=-ENL_V_MAT_EXTRU_3_REACH, mode=Mode.PRIVATE) & part.part
    add(enl_v_mat_extru_3_tool1.solids().sort_by_distance((-2.006088, 20.581186, 12))[0], mode=Mode.SUBTRACT)

    # Esquisse5 → Enlèv. mat.-Extru.4 (cut, up to next)
    with BuildSketch(Plane(origin=(0, 28.53118588, 0), x_dir=(1, 0, 0), z_dir=(0, 1, 0)), mode=Mode.PRIVATE) as enl_v_mat_extru_4_sk1:
        with Locations((-2.017786304, -12.014313461)):
            Circle(ESQUISSE5_R)
    enl_v_mat_extru_4_tool1 = extrude(enl_v_mat_extru_4_sk1.sketch, amount=-ENL_V_MAT_EXTRU_4_REACH, mode=Mode.PRIVATE) & part.part
    add(enl_v_mat_extru_4_tool1.solids().sort_by_distance((-2.017786, 28.531186, 12.014313))[0], mode=Mode.SUBTRACT)

    # Esquisse6 → Enlèv. mat.-Extru.5 (cut)
    with BuildSketch(Plane(origin=(0, 19.83118588, 0), x_dir=(1, 0, 0), z_dir=(0, 1, 0))):
        with Locations((14.993912425, -12)):
            Circle(ESQUISSE6_R)
    extrude(amount=-ENL_V_MAT_EXTRU_5_DEPTH, mode=Mode.SUBTRACT)

    # Esquisse7 → Enlèv. mat.-Extru.6 (cut)
    with BuildSketch(Plane.XY.offset(3)):
        with Locations((2.077482888, 31.18118588)):
            Rectangle(ESQUISSE7_W, ESQUISSE7_H)
    extrude(amount=-ENL_V_MAT_EXTRU_6_DEPTH, mode=Mode.SUBTRACT)

    # Esquisse8 → Enlèv. mat.-Extru.7 (cut, two sides: drawn at the far end of the back side and taken through both)
    with BuildSketch(Plane.XY.offset(2).offset(-ENL_V_MAT_EXTRU_7_DEPTH_BACK)):
        with Locations((14.607691418, 24.992571009)):
            Rectangle(ESQUISSE8_W, ESQUISSE8_H)
    extrude(amount=ENL_V_MAT_EXTRU_7_DEPTH + ENL_V_MAT_EXTRU_7_DEPTH_BACK, mode=Mode.SUBTRACT)

    # Esquisse9 → Enlèv. mat.-Extru.8 (cut, up to next)
    with BuildSketch(Plane(origin=(0, 5.88118588, 0), x_dir=(1, 0, 0), z_dir=(0, 1, 0)), mode=Mode.PRIVATE) as enl_v_mat_extru_8_sk1:
        with BuildLine():
            Line((14.993912425, -7), (6.993912425, -7))
            Line((6.993912425, -7), (6.993912425, -12))
            Line((6.993912425, -12), (19.993912425, -12))
            ThreePointArc((19.993912425, -12), (18.529446331, -8.464466094), (14.993912425, -7))
        make_face()
    enl_v_mat_extru_8_tool1 = extrude(enl_v_mat_extru_8_sk1.sketch, amount=-ENL_V_MAT_EXTRU_8_REACH, mode=Mode.PRIVATE) & part.part
    add(enl_v_mat_extru_8_tool1.solids().sort_by_distance((13.009618, 5.881186, 9.624436))[0], mode=Mode.SUBTRACT)

    # Esquisse10 → Enlèv. mat.-Extru.9 (cut, up to next)
    with BuildSketch(Plane(origin=(0, 0.58118588, 0), x_dir=(1, 0, 0), z_dir=(0, 1, 0)), mode=Mode.PRIVATE) as enl_v_mat_extru_9_sk1:
        with Locations((29.993912425, -12)):
            Circle(ESQUISSE10_R)
    enl_v_mat_extru_9_tool1 = extrude(enl_v_mat_extru_9_sk1.sketch, amount=-ENL_V_MAT_EXTRU_9_REACH, mode=Mode.PRIVATE) & part.part
    add(enl_v_mat_extru_9_tool1.solids().sort_by_distance((29.993912, 0.581186, 12))[0], mode=Mode.SUBTRACT)

    # Esquisse11 → Enlèv. mat.-Extru.10 (cut, through all)
    with BuildSketch(Plane.XZ.offset(1.41881412)):
        with Locations((29.993912425, 12)):
            Circle(ESQUISSE11_R)
    extrude(amount=ENL_V_MAT_EXTRU_10_DEPTH, mode=Mode.SUBTRACT)

    # Esquisse17 → Enlèv. mat.-Extru.11 (cut, two sides: drawn at the far end of the back side and taken through both)
    with BuildSketch(Plane.XZ.offset(-26.83118588).offset(-ENL_V_MAT_EXTRU_11_DEPTH_BACK)):
        with Locations((14.993912425, 12)):
            Circle(ESQUISSE17_R)
    extrude(amount=ENL_V_MAT_EXTRU_11_DEPTH + ENL_V_MAT_EXTRU_11_DEPTH_BACK, mode=Mode.SUBTRACT)

    # Esquisse18 → Enlèv. mat.-Extru.12 (cut, two sides: drawn at the far end of the back side and taken through both)
    with BuildSketch(Plane.XZ.offset(-17.83118588).offset(-ENL_V_MAT_EXTRU_12_DEPTH_BACK)):
        with Locations((23.993912425, 12)):
            Circle(ESQUISSE18_R)
    extrude(amount=ENL_V_MAT_EXTRU_12_DEPTH + ENL_V_MAT_EXTRU_12_DEPTH_BACK, mode=Mode.SUBTRACT)

    # Esquisse19 → Enlèv. mat.-Extru.13 (cut)
    with BuildSketch(Plane.XY.offset(6)):
        Polygon((12.393912425, 33.08118588), (-12.306087575, 54.58118588), (-12.306087575, 57.58118588), (-14.706087575, 57.58118588), (-17.006087575, 57.58118588), (-17.006087575, 28.53118588), (8.433386109, 28.53118588), align=None)
    extrude(amount=-ENL_V_MAT_EXTRU_13_DEPTH, mode=Mode.SUBTRACT)


solid = part.part
